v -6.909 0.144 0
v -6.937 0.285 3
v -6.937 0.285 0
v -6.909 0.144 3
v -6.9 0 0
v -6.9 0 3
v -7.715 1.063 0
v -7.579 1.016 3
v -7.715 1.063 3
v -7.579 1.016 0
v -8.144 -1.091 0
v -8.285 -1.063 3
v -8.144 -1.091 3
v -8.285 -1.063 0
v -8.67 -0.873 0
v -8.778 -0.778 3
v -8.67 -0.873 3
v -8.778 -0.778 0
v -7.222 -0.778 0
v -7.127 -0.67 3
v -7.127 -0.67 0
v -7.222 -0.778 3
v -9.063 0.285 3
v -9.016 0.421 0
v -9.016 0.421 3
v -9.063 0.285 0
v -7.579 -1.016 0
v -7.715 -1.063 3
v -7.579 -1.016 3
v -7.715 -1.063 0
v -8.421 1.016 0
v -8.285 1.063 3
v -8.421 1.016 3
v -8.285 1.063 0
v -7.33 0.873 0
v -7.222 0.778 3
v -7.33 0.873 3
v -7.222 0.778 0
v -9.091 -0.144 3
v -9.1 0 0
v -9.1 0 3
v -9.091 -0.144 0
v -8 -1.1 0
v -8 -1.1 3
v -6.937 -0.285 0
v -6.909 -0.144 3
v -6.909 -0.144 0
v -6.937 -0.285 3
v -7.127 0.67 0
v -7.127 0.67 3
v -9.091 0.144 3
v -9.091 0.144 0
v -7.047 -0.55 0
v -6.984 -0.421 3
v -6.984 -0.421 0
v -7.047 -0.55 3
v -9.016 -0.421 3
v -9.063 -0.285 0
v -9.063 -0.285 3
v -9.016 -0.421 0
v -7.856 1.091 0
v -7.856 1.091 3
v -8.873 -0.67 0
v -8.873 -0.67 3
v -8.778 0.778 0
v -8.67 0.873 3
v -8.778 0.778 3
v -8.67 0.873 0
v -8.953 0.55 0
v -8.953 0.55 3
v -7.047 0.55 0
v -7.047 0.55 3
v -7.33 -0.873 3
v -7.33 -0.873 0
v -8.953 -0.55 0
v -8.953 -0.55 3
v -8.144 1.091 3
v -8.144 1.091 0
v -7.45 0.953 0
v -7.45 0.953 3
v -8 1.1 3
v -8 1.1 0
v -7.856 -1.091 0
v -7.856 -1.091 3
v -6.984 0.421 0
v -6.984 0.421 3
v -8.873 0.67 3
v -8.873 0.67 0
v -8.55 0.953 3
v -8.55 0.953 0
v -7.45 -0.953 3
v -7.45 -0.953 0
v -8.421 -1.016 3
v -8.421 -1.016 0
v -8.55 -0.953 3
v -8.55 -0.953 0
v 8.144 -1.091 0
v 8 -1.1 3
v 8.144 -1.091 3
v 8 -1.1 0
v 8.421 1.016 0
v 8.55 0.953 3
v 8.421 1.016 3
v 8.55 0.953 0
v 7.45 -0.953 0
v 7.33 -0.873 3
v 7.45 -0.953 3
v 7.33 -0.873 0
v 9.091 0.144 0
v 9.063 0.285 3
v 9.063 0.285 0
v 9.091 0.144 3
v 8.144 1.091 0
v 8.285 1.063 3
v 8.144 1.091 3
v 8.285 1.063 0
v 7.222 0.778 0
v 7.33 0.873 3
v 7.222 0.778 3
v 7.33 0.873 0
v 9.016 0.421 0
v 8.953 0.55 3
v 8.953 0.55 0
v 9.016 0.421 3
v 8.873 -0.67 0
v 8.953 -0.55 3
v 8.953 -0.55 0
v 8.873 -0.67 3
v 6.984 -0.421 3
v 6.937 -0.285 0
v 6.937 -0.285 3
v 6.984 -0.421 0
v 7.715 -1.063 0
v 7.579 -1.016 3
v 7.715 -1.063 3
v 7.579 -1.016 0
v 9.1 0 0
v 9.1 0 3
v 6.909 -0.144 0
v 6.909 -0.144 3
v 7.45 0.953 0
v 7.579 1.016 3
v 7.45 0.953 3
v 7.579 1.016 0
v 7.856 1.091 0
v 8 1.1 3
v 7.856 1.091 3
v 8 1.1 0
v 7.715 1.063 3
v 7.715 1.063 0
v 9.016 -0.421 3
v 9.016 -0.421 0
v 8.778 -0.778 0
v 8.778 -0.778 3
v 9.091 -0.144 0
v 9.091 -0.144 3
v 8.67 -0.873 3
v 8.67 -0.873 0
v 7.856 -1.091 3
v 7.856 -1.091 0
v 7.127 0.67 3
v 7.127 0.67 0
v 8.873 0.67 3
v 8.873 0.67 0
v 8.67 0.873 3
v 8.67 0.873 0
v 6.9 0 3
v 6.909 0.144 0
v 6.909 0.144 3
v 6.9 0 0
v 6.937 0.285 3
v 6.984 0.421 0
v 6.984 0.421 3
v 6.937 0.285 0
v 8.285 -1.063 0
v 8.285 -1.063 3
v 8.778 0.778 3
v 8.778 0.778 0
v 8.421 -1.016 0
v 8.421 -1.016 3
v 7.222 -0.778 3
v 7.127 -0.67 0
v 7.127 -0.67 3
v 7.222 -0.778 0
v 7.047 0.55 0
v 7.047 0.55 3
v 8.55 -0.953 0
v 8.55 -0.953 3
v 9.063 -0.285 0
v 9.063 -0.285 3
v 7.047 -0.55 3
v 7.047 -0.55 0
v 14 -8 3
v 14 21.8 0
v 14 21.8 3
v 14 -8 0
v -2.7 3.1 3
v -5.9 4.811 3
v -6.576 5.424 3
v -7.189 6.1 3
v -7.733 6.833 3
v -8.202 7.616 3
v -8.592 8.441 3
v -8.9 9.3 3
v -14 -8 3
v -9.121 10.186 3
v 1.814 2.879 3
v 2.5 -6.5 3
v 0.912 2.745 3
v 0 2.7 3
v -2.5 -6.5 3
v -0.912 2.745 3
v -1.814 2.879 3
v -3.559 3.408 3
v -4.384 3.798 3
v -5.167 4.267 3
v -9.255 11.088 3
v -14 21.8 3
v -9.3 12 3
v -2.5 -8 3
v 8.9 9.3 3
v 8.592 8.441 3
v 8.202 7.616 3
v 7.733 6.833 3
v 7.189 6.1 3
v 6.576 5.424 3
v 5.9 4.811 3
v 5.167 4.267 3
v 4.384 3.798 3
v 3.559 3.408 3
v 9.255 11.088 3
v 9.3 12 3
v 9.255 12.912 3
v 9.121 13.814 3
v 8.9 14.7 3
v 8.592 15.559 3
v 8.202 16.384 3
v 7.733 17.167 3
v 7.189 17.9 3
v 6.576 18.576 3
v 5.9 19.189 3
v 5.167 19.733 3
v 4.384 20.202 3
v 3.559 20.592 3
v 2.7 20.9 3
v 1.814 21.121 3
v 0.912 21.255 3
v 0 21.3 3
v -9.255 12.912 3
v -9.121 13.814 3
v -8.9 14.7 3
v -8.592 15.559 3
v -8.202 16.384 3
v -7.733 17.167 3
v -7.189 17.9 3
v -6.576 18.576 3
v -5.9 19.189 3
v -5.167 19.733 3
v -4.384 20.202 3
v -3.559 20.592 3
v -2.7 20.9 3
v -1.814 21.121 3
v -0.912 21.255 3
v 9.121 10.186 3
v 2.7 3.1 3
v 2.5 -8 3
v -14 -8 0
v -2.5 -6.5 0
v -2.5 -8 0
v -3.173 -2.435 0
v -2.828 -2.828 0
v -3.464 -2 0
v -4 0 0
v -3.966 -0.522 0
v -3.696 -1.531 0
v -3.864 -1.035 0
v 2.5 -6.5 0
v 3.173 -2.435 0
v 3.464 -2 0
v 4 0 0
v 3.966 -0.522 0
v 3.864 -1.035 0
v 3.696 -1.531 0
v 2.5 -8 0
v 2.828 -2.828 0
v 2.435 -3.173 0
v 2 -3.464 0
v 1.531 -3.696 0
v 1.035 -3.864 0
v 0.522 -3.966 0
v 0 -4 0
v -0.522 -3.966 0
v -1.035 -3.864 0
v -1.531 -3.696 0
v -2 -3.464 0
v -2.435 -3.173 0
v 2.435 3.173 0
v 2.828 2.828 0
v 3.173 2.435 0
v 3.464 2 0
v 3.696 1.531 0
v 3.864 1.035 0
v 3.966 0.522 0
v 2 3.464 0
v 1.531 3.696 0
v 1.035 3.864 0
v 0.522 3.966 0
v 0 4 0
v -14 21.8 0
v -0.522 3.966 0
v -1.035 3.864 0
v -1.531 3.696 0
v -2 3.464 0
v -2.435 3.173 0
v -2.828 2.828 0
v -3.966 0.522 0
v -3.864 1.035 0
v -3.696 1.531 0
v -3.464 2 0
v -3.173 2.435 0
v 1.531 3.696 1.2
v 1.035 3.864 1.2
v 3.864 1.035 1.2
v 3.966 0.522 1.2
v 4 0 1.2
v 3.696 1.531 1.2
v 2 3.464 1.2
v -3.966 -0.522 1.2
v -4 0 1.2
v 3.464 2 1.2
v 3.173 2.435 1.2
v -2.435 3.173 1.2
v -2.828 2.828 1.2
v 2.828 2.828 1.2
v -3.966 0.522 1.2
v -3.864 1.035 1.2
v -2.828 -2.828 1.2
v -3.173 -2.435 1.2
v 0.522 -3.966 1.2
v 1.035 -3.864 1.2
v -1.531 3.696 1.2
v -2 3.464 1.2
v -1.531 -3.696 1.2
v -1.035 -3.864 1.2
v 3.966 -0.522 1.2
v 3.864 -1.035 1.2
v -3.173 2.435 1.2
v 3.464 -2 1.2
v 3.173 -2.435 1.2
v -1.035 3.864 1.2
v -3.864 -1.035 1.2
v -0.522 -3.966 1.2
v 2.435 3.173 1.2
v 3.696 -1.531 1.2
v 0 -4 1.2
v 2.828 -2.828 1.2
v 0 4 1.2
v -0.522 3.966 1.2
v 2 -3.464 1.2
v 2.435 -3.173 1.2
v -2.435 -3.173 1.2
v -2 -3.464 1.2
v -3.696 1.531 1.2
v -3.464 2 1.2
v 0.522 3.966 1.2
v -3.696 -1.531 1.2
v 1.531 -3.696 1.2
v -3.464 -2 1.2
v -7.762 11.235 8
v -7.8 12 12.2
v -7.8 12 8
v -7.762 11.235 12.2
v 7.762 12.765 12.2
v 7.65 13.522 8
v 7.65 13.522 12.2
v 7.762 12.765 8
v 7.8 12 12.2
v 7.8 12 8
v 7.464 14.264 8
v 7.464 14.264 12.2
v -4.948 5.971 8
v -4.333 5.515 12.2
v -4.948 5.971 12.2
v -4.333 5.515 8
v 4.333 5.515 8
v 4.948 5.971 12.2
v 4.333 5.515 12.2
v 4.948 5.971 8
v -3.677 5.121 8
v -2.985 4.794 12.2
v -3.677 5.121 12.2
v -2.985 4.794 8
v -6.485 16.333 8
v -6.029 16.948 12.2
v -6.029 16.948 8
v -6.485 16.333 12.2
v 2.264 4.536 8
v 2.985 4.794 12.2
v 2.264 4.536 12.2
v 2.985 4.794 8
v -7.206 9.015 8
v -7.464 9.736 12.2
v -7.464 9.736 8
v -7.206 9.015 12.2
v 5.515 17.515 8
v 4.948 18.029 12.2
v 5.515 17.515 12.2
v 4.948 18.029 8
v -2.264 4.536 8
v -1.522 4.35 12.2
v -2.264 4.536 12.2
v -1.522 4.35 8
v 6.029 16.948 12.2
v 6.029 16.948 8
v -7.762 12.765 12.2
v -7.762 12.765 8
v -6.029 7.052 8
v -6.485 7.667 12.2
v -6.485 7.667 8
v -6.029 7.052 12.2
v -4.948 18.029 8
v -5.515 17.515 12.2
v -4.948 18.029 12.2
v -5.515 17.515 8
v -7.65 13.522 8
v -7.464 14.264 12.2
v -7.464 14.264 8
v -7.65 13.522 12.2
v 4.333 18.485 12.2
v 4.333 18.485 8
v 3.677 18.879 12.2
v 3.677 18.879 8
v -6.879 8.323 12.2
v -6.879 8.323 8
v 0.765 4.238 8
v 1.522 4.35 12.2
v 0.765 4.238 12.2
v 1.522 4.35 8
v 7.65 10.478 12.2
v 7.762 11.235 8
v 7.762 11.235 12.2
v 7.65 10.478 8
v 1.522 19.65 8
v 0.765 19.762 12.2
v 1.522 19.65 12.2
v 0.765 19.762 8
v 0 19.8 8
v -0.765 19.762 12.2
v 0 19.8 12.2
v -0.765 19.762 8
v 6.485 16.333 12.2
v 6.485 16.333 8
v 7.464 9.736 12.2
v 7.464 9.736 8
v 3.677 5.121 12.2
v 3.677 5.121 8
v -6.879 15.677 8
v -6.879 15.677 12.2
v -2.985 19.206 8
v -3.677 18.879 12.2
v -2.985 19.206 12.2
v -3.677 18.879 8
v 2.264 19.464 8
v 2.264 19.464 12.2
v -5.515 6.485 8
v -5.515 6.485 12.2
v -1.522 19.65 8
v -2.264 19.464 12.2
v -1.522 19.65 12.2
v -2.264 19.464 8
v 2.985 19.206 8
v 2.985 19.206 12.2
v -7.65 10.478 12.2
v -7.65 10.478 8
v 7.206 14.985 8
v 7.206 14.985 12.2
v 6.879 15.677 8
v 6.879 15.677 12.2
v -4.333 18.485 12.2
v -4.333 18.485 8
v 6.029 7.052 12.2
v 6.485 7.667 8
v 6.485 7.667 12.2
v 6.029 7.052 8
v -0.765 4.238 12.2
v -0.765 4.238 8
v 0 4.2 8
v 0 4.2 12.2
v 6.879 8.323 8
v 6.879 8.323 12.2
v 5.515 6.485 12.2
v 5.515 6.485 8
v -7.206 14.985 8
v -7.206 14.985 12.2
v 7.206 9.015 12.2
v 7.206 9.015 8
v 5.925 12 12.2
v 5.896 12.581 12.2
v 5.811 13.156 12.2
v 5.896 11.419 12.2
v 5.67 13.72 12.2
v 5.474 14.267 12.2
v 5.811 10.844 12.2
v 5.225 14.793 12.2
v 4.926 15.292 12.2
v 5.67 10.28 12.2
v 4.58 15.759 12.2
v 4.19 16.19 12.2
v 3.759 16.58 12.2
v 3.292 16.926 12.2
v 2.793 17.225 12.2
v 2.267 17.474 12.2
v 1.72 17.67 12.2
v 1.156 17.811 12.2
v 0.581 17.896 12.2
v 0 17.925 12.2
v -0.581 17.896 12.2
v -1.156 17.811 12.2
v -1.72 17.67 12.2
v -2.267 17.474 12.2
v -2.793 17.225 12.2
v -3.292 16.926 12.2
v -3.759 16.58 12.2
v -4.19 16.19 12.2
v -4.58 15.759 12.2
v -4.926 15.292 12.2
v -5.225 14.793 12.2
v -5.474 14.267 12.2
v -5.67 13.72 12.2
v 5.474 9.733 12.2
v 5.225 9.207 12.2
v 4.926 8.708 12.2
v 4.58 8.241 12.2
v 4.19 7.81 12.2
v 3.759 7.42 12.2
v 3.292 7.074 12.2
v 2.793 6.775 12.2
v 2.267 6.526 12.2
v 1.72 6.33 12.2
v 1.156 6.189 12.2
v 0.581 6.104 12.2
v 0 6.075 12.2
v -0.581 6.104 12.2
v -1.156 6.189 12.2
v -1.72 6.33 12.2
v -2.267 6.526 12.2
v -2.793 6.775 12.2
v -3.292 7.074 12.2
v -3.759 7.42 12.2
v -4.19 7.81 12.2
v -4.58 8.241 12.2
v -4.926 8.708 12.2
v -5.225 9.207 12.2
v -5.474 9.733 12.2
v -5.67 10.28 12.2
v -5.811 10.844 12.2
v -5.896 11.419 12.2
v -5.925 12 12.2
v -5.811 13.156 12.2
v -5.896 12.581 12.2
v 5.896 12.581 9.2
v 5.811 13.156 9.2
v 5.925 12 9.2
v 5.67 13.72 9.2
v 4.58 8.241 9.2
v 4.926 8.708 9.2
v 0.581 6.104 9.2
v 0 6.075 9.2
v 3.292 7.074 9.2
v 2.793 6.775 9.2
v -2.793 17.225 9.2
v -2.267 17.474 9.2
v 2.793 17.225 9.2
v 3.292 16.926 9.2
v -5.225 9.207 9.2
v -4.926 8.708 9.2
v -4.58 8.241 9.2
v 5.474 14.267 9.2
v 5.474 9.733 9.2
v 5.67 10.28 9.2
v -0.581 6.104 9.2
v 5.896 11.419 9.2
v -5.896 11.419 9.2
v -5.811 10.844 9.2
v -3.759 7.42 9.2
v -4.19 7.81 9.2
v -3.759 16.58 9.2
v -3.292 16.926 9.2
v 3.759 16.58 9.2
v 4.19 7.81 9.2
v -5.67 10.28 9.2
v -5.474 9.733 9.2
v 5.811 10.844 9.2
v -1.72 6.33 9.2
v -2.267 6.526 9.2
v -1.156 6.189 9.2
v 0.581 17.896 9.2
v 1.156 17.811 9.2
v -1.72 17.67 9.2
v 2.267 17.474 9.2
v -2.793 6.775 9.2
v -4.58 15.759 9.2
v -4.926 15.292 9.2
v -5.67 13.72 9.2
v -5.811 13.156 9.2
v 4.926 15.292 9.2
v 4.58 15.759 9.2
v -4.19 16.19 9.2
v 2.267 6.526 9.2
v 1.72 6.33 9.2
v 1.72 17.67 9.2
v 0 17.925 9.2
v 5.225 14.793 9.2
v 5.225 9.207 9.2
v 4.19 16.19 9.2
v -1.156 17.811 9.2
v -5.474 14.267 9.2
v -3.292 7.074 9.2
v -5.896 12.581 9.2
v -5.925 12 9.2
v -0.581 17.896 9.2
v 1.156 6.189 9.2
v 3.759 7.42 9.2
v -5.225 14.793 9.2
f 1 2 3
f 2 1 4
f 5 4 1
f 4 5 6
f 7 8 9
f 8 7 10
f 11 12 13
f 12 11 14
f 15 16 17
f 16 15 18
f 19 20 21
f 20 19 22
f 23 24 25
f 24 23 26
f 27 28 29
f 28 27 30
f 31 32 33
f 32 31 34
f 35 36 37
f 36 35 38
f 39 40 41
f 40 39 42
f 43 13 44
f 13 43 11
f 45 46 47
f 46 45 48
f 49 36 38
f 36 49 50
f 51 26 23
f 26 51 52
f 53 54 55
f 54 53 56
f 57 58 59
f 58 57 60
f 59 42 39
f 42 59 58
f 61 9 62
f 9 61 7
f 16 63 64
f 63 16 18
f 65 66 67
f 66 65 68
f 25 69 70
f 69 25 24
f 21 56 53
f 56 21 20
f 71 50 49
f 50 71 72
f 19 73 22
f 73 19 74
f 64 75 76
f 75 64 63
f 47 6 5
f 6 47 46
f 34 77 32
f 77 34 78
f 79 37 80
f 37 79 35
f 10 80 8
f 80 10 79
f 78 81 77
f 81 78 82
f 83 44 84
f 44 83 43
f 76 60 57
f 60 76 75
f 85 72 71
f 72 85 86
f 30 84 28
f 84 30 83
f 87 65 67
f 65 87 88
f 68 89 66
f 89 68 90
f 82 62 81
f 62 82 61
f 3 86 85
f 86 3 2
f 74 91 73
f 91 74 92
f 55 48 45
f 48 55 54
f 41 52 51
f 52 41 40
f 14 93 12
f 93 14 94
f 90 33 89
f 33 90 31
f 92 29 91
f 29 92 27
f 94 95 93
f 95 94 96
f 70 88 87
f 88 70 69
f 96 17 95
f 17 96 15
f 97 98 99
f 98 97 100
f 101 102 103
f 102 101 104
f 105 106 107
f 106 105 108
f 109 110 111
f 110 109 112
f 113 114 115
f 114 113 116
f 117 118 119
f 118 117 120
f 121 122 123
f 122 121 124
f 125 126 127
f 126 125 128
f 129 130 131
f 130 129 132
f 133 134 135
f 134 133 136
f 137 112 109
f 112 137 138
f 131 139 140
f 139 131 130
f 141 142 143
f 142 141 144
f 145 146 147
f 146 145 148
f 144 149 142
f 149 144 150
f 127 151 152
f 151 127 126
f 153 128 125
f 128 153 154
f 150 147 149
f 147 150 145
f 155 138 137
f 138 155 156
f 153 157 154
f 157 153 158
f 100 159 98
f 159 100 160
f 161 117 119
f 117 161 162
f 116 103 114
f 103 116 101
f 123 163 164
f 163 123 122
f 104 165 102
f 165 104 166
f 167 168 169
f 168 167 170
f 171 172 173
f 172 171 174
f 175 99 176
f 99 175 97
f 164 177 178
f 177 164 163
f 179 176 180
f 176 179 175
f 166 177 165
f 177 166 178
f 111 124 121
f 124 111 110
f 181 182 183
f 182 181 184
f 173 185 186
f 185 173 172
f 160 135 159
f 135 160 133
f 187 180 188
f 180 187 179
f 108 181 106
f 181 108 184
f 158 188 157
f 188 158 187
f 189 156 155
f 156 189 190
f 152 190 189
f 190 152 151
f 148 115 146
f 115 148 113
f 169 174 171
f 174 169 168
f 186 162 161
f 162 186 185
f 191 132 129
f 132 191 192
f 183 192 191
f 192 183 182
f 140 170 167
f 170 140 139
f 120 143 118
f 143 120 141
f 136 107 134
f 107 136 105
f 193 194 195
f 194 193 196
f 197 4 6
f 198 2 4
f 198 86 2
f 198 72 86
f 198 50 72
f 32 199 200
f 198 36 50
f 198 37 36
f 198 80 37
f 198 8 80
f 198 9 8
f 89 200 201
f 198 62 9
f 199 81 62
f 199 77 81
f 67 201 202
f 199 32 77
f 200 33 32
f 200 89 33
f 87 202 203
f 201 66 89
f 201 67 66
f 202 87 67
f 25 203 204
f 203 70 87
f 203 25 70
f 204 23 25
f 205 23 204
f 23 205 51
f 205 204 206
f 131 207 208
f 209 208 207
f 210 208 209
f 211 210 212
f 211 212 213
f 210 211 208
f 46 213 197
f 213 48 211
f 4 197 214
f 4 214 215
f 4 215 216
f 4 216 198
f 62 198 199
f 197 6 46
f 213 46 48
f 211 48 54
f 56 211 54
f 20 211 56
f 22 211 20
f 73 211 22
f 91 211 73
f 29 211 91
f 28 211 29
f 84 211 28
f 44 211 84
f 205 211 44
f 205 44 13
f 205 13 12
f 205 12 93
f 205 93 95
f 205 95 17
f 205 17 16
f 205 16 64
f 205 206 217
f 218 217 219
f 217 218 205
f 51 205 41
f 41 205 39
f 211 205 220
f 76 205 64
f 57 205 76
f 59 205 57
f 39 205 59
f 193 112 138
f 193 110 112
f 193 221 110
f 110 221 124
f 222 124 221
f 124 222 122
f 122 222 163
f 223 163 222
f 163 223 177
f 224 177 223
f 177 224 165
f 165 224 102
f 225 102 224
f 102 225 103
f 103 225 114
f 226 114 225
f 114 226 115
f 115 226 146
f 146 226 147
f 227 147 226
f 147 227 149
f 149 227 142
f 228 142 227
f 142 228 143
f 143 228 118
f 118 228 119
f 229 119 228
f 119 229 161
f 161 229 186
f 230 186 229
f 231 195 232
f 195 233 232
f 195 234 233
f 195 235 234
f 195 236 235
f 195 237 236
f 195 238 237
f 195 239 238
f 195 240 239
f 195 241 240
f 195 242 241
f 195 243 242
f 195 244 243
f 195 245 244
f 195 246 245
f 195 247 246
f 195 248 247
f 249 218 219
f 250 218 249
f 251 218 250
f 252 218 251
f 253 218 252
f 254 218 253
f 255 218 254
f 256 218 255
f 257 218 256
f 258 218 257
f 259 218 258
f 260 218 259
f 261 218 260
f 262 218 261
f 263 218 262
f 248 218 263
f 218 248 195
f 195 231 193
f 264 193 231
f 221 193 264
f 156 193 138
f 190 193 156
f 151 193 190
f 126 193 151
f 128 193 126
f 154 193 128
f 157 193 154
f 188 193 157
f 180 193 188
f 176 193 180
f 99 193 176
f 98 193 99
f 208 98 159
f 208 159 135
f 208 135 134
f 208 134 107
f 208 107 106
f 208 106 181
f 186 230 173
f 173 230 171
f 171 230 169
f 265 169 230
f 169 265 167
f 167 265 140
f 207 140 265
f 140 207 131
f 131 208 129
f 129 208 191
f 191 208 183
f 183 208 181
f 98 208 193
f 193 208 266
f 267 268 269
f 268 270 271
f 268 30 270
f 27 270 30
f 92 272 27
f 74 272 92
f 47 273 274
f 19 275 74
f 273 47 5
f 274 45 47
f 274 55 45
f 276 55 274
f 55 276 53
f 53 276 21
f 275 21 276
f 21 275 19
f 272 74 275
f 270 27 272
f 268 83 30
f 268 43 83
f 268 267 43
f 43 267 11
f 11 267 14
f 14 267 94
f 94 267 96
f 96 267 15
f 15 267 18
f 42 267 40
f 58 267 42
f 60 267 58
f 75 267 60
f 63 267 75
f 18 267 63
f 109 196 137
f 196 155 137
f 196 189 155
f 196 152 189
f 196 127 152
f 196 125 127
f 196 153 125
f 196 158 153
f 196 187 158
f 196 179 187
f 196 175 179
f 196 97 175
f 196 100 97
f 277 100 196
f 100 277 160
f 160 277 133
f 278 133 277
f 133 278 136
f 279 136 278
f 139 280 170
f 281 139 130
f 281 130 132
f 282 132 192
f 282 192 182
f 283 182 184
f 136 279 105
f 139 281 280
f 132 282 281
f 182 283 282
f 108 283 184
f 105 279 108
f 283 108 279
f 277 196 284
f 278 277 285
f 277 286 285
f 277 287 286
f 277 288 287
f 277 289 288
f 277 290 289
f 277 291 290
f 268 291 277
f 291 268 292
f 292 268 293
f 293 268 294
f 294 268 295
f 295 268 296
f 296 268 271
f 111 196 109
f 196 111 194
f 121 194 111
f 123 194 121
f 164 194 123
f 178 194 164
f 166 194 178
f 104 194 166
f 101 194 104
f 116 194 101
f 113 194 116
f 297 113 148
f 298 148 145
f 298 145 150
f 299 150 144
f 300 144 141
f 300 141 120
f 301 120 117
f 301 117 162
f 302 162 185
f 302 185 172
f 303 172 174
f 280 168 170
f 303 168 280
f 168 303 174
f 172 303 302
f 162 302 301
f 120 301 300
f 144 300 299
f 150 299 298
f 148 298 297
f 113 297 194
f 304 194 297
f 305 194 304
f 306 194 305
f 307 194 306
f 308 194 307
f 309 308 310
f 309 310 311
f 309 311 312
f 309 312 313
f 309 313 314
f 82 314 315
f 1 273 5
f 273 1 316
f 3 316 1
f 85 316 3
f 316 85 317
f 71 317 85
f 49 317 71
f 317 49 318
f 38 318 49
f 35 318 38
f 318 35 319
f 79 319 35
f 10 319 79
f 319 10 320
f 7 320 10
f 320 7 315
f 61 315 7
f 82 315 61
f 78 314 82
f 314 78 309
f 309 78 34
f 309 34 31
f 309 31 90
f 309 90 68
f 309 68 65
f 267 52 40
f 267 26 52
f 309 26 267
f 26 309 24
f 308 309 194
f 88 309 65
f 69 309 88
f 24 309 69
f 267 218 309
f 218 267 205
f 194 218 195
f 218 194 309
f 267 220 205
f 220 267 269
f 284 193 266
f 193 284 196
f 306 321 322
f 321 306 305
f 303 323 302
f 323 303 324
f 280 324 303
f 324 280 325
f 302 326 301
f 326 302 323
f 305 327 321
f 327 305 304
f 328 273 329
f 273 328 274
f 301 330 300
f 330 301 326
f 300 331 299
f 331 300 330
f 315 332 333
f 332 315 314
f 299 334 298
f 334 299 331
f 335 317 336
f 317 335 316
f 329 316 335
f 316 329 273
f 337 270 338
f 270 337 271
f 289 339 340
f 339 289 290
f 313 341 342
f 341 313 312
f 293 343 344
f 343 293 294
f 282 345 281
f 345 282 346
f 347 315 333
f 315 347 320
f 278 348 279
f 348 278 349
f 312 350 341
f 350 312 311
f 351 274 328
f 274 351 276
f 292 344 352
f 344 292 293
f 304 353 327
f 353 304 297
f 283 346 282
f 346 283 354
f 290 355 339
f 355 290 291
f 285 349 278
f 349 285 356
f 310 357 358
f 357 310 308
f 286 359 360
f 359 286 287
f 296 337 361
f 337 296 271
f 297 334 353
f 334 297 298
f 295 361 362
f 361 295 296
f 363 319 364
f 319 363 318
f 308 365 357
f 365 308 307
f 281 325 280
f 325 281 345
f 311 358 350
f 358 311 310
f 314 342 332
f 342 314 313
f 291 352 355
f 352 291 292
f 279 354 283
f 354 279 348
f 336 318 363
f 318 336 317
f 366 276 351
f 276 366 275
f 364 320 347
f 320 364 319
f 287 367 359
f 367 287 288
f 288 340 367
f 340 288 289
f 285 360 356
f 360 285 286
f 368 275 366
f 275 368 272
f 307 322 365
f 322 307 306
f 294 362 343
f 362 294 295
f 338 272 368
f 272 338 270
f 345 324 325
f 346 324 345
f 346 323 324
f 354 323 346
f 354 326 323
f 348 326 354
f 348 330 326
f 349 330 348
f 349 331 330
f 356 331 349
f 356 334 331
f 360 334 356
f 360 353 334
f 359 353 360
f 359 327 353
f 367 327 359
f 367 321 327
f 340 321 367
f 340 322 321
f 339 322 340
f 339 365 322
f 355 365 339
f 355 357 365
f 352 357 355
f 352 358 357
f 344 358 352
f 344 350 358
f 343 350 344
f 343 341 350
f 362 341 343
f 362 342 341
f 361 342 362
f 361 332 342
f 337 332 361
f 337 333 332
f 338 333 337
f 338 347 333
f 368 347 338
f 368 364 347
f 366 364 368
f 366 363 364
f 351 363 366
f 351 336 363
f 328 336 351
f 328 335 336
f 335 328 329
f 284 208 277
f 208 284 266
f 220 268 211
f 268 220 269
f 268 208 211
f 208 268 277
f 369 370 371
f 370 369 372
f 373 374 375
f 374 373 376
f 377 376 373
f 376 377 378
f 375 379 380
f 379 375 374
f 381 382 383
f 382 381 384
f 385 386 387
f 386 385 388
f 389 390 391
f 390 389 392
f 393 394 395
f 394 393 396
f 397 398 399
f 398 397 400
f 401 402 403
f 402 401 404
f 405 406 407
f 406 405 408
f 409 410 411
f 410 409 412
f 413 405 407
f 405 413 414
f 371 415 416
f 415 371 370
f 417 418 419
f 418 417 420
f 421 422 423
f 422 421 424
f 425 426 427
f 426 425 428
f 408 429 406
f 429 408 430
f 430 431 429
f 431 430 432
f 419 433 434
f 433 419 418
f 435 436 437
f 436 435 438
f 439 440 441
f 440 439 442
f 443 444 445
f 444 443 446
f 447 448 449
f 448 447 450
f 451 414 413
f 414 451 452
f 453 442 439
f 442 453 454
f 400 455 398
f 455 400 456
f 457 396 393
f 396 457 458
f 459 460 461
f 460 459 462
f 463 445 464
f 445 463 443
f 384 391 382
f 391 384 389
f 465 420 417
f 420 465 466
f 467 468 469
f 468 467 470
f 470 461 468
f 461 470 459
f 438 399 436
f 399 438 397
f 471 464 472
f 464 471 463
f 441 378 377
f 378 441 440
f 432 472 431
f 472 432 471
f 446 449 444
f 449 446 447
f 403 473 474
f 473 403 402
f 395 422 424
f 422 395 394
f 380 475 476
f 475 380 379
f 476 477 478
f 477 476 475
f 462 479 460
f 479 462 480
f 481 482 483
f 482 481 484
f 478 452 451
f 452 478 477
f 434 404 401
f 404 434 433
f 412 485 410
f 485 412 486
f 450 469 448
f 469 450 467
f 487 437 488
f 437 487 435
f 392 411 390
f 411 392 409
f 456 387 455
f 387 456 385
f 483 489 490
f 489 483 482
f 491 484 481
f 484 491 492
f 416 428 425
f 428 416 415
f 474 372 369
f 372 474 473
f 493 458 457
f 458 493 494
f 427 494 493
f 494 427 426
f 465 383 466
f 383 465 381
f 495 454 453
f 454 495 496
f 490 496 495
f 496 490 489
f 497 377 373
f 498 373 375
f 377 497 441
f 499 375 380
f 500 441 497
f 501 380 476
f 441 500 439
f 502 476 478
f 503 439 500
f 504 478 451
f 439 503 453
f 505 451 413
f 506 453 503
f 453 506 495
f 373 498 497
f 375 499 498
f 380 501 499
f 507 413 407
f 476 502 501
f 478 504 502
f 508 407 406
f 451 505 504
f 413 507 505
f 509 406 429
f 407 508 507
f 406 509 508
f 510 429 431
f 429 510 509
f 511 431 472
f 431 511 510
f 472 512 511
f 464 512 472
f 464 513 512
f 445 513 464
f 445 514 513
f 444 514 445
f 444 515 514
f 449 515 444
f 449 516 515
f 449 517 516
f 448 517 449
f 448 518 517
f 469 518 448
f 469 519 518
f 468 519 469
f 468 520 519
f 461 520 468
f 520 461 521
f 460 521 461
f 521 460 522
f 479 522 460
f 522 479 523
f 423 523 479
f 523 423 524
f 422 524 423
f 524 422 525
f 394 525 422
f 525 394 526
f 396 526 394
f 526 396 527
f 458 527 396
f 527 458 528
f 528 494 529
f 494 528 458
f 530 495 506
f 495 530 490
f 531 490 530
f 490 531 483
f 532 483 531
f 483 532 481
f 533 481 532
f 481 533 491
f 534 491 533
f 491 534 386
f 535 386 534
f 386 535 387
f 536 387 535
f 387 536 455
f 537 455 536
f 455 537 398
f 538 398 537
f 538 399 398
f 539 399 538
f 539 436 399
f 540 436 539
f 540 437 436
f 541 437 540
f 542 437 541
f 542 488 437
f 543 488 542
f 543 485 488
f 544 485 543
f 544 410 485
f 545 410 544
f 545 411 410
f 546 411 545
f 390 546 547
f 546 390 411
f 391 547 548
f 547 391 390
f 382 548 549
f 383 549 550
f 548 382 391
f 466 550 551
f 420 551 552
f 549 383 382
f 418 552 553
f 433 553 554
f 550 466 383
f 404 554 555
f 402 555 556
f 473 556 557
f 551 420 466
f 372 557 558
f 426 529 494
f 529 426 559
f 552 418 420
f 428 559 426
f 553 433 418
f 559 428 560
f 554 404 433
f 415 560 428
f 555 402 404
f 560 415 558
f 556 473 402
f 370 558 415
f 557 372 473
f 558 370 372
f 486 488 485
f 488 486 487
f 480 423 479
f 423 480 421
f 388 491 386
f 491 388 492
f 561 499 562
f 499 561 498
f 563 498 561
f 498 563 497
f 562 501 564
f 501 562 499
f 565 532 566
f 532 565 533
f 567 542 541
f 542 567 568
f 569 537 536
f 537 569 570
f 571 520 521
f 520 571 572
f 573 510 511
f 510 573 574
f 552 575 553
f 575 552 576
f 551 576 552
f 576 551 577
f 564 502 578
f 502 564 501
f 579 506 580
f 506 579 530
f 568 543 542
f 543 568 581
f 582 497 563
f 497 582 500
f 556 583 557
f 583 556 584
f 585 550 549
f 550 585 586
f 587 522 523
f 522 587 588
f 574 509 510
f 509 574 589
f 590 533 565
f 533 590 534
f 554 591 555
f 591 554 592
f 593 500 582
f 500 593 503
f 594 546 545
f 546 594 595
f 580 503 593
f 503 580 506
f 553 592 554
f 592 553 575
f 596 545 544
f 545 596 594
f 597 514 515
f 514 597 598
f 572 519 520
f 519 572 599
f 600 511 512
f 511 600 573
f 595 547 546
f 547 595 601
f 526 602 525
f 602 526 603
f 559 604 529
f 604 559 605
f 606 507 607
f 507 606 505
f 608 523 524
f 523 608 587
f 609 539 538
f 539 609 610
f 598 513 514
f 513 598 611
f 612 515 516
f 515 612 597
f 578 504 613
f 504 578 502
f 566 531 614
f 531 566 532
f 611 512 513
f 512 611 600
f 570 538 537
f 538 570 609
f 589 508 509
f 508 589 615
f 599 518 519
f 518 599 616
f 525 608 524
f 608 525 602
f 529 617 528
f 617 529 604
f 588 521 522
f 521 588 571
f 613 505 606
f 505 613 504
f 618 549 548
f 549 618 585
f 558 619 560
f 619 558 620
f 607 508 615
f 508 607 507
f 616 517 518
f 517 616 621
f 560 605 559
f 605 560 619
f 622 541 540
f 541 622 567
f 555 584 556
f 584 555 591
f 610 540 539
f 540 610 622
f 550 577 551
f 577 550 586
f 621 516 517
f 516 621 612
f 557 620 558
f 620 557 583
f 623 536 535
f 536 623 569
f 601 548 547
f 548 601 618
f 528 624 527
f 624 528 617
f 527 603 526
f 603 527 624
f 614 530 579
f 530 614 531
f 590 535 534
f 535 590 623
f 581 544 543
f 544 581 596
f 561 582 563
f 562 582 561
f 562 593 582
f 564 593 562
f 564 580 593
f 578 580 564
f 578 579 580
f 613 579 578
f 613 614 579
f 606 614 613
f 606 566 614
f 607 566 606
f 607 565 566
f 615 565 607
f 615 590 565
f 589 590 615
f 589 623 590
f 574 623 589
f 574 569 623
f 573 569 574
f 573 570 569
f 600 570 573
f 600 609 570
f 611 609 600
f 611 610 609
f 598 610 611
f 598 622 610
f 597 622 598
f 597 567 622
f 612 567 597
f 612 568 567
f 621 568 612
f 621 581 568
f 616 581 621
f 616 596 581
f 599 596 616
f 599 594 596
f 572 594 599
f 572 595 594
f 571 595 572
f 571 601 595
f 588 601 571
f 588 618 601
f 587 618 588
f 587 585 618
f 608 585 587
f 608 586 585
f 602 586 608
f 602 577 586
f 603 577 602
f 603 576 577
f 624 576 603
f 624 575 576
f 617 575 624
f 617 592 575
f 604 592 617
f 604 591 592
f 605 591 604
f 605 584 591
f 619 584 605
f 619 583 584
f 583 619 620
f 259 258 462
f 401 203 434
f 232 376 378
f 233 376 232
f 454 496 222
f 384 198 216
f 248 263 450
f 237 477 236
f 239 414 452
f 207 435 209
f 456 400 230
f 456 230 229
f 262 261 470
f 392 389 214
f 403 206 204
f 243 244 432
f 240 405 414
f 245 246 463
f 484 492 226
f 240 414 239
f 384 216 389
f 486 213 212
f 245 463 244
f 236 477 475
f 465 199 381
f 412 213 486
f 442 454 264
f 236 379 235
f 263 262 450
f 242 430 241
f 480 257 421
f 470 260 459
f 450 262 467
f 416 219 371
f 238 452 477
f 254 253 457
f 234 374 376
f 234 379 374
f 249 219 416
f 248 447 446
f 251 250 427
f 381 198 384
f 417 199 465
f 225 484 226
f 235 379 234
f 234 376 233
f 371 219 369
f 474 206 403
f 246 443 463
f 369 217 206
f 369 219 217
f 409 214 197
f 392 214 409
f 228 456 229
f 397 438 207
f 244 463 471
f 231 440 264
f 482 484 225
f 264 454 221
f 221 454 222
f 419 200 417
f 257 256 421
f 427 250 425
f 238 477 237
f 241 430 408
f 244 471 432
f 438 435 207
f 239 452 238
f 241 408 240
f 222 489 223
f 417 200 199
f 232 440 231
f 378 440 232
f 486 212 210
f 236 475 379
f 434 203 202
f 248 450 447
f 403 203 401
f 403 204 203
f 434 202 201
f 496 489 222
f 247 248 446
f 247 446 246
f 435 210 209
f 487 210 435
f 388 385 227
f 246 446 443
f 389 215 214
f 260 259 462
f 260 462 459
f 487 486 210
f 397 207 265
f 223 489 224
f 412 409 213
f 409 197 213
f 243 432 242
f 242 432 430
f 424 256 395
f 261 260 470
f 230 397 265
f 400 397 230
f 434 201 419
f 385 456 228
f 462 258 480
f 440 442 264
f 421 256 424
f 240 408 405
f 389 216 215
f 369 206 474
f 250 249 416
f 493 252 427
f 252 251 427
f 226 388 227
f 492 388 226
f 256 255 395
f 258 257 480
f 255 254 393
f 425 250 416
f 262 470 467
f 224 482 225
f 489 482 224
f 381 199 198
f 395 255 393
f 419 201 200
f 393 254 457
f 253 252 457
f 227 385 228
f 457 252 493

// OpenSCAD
// file: mount_standard.scad
// =============================================================================
// mount_standard.scad — the shared wrist-mount interface for the robot arm
// =============================================================================
//
// WHAT THIS IS
//   One printed "adapter plate" that bolts to the last servo's horn on your arm.
//   EVERY tool the arm carries (the pen holder, this magnet pickup, a future
//   gripper...) is built starting from THIS plate, so they all mount the same
//   way, in the same spot, facing the same direction. Design a tool once and it
//   clicks onto the arm like the others — no re-measuring, no re-drilling.
//
//   This file is a LIBRARY, not a finished part. A tool file pulls it in with:
//         use <mount_standard.scad>
//   then calls  mount_plate();  and builds its own body on top of it.
//
// HOW TO USE IT (makers)
//   1. Open this file in OpenSCAD and press F5 to preview the bare plate.
//   2. Measure YOUR servo horn (each parameter below says what to measure) and
//      edit the numbers. This one file is the single place the interface lives.
//   3. Don't slice THIS file for real use — slice a TOOL file (e.g.
//      magnet_tool.scad) that includes it. The bare plate is only handy as a
//      quick "does my horn fit?" test print.
//
// RENDER STATUS (2026-08-07)
//   OpenSCAD 2021.01 rendered the default plate and the no-hub/no-notch branch
//   to simple manifold STL meshes without warnings. This validates the source
//   geometry only. The placeholder dimensions, physical fit, strength, slicing
//   and print behaviour remain unverified.
//
// SAFETY (arm rails)
//   This file makes ONLY the passive mounting interface — there is no motion
//   code here and none belongs here. This passive model makes no claim about
//   Arduino startup or hardware safety. Any powered arm route still needs
//   measured limits, reviewed startup and supervised testing. Any tool that
//   lifts a load is a "check this yourself."
// =============================================================================


// ---- BENCH WORDS (one line each) --------------------------------------------
// servo horn    : the star/arm-shaped disc bolted to the servo shaft that moves.
// bolt pattern  : the spacing + size of the screw holes. Match it, tools fit.
// key / keying  : a shape that fits only one way so the tool can't spin or sit
//                 crooked. Here: a round recess that seats the horn's raised hub,
//                 plus a notch that marks the mounting ("back") edge.
// clearance hole: a hole a bit BIGGER than the screw so the screw slides through
//                 freely (it grips the horn underneath, not this plate).


// =============================================================================
// PARAMETERS — measure your horn, then edit. Each has its own note.
// =============================================================================

// -- The two horn screws (the bolt pattern every tool shares) --
horn_span     = 16.0;   // PLACEHOLDER: centre-to-centre distance between the two horn screws
                        // (mm). Measure hole-centre to hole-centre on your horn.
horn_screw_d  = 2.2;    // PLACEHOLDER: screw clearance diameter (mm). Measure the
                        // real fastener and validate it with a thin test print.

// -- Plate size + thickness --
mount_th      = 3.0;    // PLACEHOLDER: plate thickness (mm). Determine from the
                        // real load, material, orientation and a supervised test.
plate_w       = 28.0;   // plate width, across the two screws (mm).
plate_front   = 10.0;   // how far the plate reaches FORWARD of the horn centre
                        // (mm). Tools that need more room pass a bigger value.
plate_back    =  8.0;   // how far it reaches BEHIND the horn centre (mm).

// -- Keying feature #1: the hub recess (centres the plate, resists wobble) --
// If the measured horn has a raised round hub, a shallow recess can centre the
// plate on the shaft. With the two
// offset screws, it stops the plate shifting or pivoting.
horn_hub_d    = 8.0;    // diameter of your horn's raised centre hub (mm).
                        // Set to 0 to switch the hub recess OFF.
horn_hub_th   = 1.2;    // recess depth (mm) — keep it a little LESS than the hub's
                        // real height so the plate still clamps flat on the screws.

// -- Keying feature #2: the orientation notch (marks the mounting edge) --
// A small notch cut into the BACK edge. Convention for this whole tool family:
// build every tool with its working end (pen tip, magnet, fingers) pointing to
// +Y, and the notch always marks the opposite, "back", edge. Same notch = every
// tool goes on the arm the same way round, every time.
key_notch     = true;   // set false to remove the notch.
key_notch_w   = 5.0;    // notch width (mm).
key_notch_d   = 1.5;    // notch depth (mm).

// -- Print quality --
$fn = 48;               // roundness of holes/cylinders in preview + render.


// =============================================================================
// mount_top() — height of the plate's top face. A tool stacks its body on top:
//     translate([0, 0, mount_top()]) my_tool_body();
// =============================================================================
function mount_top() = mount_th;


// =============================================================================
// mount_bolt_holes() — just the two horn-screw clearance holes (to subtract).
// A tool that wants to draw its own custom plate can reuse only this pattern.
// =============================================================================
module mount_bolt_holes() {
    for (sx = [-horn_span/2, horn_span/2])
        translate([sx, 0, -0.5])
            cylinder(h = mount_th + 1, d = horn_screw_d);
}


// =============================================================================
// mount_plate() — the full shared interface plate.
//   * flat plate centred on the origin, top face at Z = mount_th
//   * the two horn-screw clearance holes (bolt pattern) on the origin line
//   * a shallow hub recess on the BOTTOM (key #1 — centres it on the horn)
//   * a notch on the BACK edge (key #2 — marks the mounting orientation)
//   front / back = how far the plate reaches in +Y / -Y. A tool passes a bigger
//   `front` when it needs plate under a part that sits forward of the screws.
// =============================================================================
module mount_plate(front = plate_front, back = plate_back) {
    difference() {
        // the plate itself
        translate([-plate_w/2, -back, 0])
            cube([plate_w, back + front, mount_th]);

        // the two horn-screw clearance holes (the shared bolt pattern)
        mount_bolt_holes();

        // key #1 — hub recess, cut into the BOTTOM face, only if enabled
        if (horn_hub_d > 0)
            translate([0, 0, -0.01])
                cylinder(h = horn_hub_th + 0.01, d = horn_hub_d);

        // key #2 — orientation notch on the BACK edge (at -Y)
        if (key_notch)
            translate([-key_notch_w/2, -back - 0.5, -0.5])
                cube([key_notch_w, key_notch_d + 0.5, mount_th + 1]);
    }
}


// =============================================================================
// PREVIEW — draws the bare plate when you open THIS file directly.
// (A tool file that `use`s this library does NOT run this line — `use` pulls in
//  the modules/function but not top-level calls, so you get the plate to build
//  on without a stray copy floating in your tool.)
// =============================================================================
mount_plate();
// main file
// =============================================================================
// magnet_tool.scad — a PASSIVE magnet-pickup tool for the robot arm
// =============================================================================
//
// WHAT THIS IS
//   The first tool built on the shared mount standard. It's the standard plate
//   (from mount_standard.scad) with a little cup on top that holds one round
//   neodymium magnet. The arm carries it to a small steel/iron part, the magnet
//   grabs it, the arm moves it, and you pull the part off by hand at the far end.
//   There are NO servos, NO wires, NO electronics — the magnet does all the work
//   and holds even with the arm powered off. Passive does NOT mean risk-free:
//   the magnet can pinch, attract unexpected metal, damage sensitive items or
//   drop a load. Test the exact magnet, part and orientation before any lift.
//
// HOW TO USE IT (makers)
//   1. Keep this file in the SAME folder as mount_standard.scad (it pulls it in).
//   2. Measure your magnet + servo horn, edit the parameters below.
//   3. Press F5 to preview, F6 to render, then export/slice and print.
//   4. Press-fit the magnet into the cup (fit + glue note in the README).
//
// RENDER STATUS (2026-08-07)
//   OpenSCAD 2021.01 rendered the default parameter set to a simple manifold
//   STL mesh without warnings. The dimensions are still placeholders; fit,
//   retention, strength, slicing, printing and payload remain unverified.
//
// SAFETY (arm rails + lifting)
//   No motion code lives here. This passive model cannot guarantee arm startup
//   or motion safety; powered use needs a reviewed route and supervision. A lift is load-bearing:
//   CHECK THE MAGNET HOLDS YOUR PART — at the height and speed you'll use —
//   BEFORE trusting the arm to carry it. Neodymium magnets are brittle and pinch
//   skin; keep them away from cards, drives, and pacemakers.
// =============================================================================

use <mount_standard.scad>


// ---- BENCH WORDS ------------------------------------------------------------
// neodymium disc : a small, very strong round magnet, sold as "D x H", e.g.
//                  "12 x 3 mm". Cheap in bags of 10-20.
// press-fit      : a pocket a hair SMALLER than the magnet so it wedges in and
//                  stays with no glue. Loose? A drop of glue fixes it.
// payload        : the load this exact arm/tool combination can carry under the
//                  tested conditions. No payload value is established here.


// =============================================================================
// MAGNET PARAMETERS — measure YOUR magnet, then edit. Each in its own note.
// =============================================================================

// -- Magnet size (calipers, or read the bag label "D x H") --
magnet_d      = 12.0;   // magnet DIAMETER (mm). Common discs: 10, 12, 15, 20.
magnet_h      =  3.0;   // magnet HEIGHT / thickness (mm).

// -- Press-fit tightness --
magnet_fit    = 0.15;   // EXPERIMENTAL: amount subtracted from magnet_d (mm).
                        // Larger positive = SMALLER/tighter pocket. Won't go in?
                        // Lower this value. Too loose? Raise it in small steps or
                        // use a separately validated retention method.

// -- Cup + stem --
cup_wall      = 1.8;    // wall thickness around the magnet (mm).
cup_floor     = 1.2;    // solid floor UNDER the magnet (mm). Keep this: the pull
                        // goes through plastic, so no metal-on-metal clack and the
                        // magnet can't fall through.
stem_h        = 5.0;    // how far the cup stands off the plate (mm). Taller reaches
                        // into tighter spots; shorter is stiffer.
magnet_offset_y = 12.0; // how far FORWARD of the horn screws the cup sits (mm).
                        // Forward keeps the two mounting screws reachable with a
                        // screwdriver and puts the pickup point where you can see
                        // it. Don't go below ~11 or the cup covers the screws.

// -- Print quality --
$fn = 64;


// =============================================================================
// magnet_cup() — the cup that holds the magnet. Pocket opens UPWARD (+Z), with a
// solid floor beneath. Built from Z = 0 up; lifted onto the plate by magnet_tool.
// =============================================================================
module magnet_cup() {
    cup_od   = magnet_d + 2 * cup_wall;   // outer diameter of the cup
    pocket_d = magnet_d - magnet_fit;     // press-fit pocket (a touch smaller)
    difference() {
        cylinder(h = cup_floor + magnet_h, d = cup_od);   // solid cup body
        translate([0, 0, cup_floor])                       // the magnet pocket
            cylinder(h = magnet_h + 0.5, d = pocket_d);
    }
}


// =============================================================================
// cup_on_stem() — the magnet cup lifted on a short tapered stem.
// =============================================================================
module cup_on_stem() {
    cup_od = magnet_d + 2 * cup_wall;
    // tapered stem blends the wide plate up to the cup (prints without supports)
    cylinder(h = stem_h, d1 = cup_od + 3, d2 = cup_od);
    translate([0, 0, stem_h])
        magnet_cup();
}


// =============================================================================
// magnet_tool() — the finished part: shared plate + magnet cup, forward of the
// screws so a screwdriver can still reach the two mounting screws.
// =============================================================================
module magnet_tool() {
    cup_od      = magnet_d + 2 * cup_wall;
    // reach the plate forward far enough to fully support the cup
    plate_reach = magnet_offset_y + cup_od / 2 + 2;

    mount_plate(front = plate_reach);          // the shared interface plate

    translate([0, magnet_offset_y, mount_top()])
        cup_on_stem();                          // the magnet cup, out front
}


// =============================================================================
// PREVIEW / RENDER — this IS the finished part. F5 preview, F6 render, slice.
// =============================================================================
magnet_tool();
